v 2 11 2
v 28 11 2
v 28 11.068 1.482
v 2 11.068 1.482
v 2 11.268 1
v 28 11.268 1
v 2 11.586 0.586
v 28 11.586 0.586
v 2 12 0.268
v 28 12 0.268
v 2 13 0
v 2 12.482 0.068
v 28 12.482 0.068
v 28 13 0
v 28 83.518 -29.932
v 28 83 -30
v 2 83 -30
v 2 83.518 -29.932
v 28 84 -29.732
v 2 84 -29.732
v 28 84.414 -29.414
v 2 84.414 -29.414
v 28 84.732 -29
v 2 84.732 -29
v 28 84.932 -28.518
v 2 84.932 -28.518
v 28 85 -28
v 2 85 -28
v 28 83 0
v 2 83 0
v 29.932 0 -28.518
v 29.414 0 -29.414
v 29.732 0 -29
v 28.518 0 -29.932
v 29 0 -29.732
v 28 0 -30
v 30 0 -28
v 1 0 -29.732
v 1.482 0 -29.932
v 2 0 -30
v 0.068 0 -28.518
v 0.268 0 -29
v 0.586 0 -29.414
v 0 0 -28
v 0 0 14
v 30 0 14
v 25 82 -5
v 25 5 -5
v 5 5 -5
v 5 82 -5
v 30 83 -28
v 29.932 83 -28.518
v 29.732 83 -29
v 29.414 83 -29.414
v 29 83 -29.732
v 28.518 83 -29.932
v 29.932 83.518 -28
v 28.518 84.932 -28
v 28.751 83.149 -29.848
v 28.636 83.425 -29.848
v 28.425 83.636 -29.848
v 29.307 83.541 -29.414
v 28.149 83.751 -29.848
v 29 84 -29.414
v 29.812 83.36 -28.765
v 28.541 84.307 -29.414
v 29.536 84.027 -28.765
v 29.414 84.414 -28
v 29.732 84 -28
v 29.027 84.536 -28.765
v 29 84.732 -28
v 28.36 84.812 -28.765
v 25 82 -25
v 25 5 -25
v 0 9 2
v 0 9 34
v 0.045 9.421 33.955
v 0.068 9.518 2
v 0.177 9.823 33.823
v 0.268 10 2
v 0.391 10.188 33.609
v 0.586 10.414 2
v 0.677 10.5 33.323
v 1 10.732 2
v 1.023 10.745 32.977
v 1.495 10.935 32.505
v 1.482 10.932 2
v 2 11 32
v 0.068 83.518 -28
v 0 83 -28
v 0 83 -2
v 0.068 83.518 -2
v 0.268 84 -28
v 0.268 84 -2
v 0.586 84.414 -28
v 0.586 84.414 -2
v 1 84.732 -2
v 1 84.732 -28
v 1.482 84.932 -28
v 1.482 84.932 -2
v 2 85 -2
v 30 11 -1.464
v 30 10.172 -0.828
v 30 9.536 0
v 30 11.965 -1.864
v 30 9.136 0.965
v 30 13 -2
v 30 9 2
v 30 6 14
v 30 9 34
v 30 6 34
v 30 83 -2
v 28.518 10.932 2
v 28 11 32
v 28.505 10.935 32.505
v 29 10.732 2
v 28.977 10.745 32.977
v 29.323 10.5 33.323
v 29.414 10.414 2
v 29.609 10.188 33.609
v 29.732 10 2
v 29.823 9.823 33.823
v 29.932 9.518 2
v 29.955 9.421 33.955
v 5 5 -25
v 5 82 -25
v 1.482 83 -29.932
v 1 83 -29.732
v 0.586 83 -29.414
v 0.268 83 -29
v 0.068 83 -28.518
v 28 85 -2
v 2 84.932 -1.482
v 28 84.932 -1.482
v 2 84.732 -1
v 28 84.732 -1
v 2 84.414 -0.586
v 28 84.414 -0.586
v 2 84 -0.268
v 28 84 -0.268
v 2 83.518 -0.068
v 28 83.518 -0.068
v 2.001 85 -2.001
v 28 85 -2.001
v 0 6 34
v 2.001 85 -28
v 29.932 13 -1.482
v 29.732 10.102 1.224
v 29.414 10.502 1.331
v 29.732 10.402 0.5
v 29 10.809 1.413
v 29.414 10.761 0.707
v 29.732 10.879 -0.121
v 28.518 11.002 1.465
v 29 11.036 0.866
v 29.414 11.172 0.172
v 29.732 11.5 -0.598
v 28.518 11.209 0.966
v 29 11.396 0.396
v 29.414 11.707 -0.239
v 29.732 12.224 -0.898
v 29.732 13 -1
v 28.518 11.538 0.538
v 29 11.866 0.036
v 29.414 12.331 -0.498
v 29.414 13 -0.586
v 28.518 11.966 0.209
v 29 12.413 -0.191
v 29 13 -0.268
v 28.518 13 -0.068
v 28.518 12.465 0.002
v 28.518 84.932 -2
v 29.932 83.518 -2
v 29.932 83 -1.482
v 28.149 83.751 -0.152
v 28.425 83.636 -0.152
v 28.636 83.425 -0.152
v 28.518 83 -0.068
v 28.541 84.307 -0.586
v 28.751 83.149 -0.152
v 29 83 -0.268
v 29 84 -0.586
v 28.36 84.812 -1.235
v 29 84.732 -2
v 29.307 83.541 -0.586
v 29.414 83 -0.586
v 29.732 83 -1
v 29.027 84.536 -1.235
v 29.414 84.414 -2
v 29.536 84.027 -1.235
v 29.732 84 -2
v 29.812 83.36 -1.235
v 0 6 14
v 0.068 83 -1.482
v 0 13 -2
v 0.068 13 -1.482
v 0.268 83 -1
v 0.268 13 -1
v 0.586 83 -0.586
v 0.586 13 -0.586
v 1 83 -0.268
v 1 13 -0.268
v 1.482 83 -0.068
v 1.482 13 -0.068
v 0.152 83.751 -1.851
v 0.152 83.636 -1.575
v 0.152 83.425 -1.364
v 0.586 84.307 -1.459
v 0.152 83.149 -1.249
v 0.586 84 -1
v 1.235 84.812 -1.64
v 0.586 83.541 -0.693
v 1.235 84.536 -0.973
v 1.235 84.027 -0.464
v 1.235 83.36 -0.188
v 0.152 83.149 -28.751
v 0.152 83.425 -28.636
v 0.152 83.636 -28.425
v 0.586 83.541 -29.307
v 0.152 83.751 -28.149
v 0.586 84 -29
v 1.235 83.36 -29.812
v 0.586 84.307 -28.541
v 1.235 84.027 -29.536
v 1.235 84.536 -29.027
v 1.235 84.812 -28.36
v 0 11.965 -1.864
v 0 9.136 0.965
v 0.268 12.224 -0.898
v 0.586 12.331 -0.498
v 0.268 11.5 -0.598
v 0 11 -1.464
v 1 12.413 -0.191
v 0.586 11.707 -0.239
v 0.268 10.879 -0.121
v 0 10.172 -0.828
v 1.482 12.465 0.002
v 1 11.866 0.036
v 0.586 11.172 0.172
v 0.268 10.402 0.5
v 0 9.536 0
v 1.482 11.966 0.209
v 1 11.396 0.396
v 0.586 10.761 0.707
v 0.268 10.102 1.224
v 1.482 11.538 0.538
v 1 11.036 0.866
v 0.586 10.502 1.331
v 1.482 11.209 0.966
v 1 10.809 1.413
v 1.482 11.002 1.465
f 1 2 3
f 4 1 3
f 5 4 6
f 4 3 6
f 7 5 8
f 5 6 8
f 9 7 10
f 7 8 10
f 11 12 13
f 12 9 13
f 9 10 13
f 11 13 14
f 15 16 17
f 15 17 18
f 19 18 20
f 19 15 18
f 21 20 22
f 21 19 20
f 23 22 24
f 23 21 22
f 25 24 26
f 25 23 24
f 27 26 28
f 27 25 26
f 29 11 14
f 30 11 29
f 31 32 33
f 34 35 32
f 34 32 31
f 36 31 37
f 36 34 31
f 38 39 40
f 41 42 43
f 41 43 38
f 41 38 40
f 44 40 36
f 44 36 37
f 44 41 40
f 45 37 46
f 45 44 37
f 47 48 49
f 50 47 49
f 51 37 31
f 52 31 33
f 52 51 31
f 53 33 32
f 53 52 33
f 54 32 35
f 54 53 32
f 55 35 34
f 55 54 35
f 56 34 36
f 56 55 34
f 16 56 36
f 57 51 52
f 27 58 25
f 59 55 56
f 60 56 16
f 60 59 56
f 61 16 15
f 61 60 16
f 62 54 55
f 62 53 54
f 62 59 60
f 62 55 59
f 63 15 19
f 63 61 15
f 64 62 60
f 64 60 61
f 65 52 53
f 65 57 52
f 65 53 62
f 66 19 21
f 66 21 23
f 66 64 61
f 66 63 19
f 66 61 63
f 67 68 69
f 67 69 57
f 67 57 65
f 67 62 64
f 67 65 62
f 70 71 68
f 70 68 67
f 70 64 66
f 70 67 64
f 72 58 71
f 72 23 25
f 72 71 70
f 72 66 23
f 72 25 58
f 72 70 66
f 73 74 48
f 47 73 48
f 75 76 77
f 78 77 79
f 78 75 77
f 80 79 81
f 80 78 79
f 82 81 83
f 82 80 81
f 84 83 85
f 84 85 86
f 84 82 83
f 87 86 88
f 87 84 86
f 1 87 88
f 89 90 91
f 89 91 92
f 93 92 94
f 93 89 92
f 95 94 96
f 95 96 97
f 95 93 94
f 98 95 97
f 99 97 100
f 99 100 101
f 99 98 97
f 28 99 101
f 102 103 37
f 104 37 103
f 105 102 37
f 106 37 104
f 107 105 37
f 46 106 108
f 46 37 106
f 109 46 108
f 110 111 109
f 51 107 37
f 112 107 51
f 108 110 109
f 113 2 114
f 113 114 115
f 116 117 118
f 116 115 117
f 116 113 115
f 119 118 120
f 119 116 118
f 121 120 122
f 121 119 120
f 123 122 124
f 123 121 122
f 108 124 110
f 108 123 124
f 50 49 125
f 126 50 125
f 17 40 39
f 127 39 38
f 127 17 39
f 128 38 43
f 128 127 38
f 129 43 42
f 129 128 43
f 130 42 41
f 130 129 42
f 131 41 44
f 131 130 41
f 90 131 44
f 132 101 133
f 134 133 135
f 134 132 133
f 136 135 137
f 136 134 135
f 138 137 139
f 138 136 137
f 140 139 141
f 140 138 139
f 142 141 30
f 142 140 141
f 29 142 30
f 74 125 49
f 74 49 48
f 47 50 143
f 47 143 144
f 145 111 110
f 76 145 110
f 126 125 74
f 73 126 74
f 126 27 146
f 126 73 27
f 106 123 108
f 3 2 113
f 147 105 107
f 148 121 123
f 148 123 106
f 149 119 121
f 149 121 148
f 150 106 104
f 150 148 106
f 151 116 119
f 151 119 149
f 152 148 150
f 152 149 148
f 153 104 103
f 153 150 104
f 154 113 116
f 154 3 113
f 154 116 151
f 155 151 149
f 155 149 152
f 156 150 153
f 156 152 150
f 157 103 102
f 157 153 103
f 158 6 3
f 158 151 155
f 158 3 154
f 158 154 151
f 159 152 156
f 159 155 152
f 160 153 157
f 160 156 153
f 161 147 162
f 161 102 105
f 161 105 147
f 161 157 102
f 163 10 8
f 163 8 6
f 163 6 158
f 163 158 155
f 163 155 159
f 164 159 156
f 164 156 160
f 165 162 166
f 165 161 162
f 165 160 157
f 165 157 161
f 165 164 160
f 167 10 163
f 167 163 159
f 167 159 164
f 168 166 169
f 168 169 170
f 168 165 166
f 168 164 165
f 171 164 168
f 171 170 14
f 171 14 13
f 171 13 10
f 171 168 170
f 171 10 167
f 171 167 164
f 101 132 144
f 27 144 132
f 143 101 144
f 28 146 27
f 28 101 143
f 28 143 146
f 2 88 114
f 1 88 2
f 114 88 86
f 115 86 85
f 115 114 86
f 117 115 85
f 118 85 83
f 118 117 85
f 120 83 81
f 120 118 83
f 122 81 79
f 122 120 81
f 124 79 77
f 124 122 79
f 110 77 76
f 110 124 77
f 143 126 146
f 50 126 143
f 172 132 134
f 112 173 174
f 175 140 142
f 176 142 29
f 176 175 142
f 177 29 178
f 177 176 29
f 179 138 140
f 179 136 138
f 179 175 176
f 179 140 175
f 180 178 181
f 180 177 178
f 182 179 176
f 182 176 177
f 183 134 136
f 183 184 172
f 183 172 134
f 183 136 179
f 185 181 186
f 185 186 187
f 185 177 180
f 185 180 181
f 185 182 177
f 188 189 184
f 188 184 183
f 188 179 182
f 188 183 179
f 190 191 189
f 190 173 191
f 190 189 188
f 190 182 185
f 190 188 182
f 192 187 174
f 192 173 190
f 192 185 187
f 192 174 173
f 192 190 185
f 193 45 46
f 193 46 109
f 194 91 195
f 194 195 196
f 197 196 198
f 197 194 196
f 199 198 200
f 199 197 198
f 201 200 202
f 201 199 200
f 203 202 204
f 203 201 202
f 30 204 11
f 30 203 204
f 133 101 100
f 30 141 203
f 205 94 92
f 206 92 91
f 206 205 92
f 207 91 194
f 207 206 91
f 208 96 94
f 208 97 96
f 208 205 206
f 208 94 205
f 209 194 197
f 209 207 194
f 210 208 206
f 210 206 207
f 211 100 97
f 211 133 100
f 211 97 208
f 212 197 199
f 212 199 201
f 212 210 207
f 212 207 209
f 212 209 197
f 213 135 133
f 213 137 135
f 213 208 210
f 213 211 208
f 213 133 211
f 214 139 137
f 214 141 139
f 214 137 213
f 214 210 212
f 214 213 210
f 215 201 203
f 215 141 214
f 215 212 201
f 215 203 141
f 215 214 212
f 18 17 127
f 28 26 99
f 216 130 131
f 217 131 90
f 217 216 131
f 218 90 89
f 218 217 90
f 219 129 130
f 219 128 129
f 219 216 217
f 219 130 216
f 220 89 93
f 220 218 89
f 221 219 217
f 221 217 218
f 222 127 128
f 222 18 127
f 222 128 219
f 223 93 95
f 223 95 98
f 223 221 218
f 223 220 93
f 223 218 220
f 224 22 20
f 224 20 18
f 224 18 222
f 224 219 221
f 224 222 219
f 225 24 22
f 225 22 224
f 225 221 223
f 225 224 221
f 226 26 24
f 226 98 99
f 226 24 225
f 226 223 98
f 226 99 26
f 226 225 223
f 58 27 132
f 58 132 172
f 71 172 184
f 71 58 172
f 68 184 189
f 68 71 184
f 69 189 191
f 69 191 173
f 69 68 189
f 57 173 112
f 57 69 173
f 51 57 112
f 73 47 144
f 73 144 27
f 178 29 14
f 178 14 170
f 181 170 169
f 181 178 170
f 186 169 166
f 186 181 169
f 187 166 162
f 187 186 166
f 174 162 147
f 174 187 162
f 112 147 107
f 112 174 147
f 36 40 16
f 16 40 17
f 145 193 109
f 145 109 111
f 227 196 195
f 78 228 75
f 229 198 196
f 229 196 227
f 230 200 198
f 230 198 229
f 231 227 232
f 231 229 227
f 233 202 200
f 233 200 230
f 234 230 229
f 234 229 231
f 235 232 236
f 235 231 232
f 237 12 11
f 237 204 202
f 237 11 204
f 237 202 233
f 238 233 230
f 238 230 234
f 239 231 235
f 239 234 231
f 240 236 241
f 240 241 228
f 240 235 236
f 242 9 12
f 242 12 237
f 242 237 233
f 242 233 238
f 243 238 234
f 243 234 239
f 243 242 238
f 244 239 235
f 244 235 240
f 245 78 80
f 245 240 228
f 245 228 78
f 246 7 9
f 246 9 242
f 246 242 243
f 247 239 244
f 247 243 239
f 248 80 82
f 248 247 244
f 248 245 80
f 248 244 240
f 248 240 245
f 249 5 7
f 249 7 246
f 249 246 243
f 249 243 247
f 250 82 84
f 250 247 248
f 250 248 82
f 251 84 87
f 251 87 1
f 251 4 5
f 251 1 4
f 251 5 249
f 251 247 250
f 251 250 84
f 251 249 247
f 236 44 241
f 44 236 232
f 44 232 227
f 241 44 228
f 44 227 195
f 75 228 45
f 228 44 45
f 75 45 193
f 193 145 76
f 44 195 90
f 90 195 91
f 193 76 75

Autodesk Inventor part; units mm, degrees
ref_plane "YZ Plane" through (0, 0, 0) normal (1, 0, 0) x (0, 1, 0)
ref_plane "XZ Plane" through (0, 0, 0) normal (0, 1, 0) x (-1, 0, 0)
ref_plane "XY Plane" through (0, 0, 0) normal (0, 0, 1) x (1, 0, 0)
sketch "Sketch1" plane through (0, 0, 0) normal (1, 0, 0) x (0, 1, 0)
  line L0 (0, 0) -> (0, -30)
  line L1 (11, 0) -> (30, 0) construction
  line L2 (0, -30) -> (85, -30)
  line L3 (11, 0) -> (85, 0)
  line L4 (85, 0) -> (85, -30)
  line L5 (0, 0) -> (0, 14)
  line L6 (11, 0) -> (14, 0) construction
  line L7 (0, 14) -> (6, 14)
  line L8 (6, 14) -> (6, 34)
  line L9 (6, 34) -> (11, 34)
  line L10 (11, 34) -> (11, 0)
  dimension "d0" = 30
  dimension "d2" = 85
  dimension "d4" = 14
  dimension "d6" = 6
  dimension "d7" = 20
  dimension "d8" = 5
  dimension "d9" = 34
extrude "Extrusion1" add sketch "Sketch1" along normal blind 30
sketch "Sketch2" plane through (0, 85, 0) normal (0, 1, 0) x (1, 0, 0)
  line L0 (5, 5) -> (5, 25)
  line L1 (5, 5) -> (25, 5) construction
  line L2 (5, 25) -> (25, 25)
  line L3 (25, 25) -> (25, 5)
  line L4 (25, 5) -> (5, 5)
  point P0 (0, 0)
  dimension "d13" = 20
  dimension "d14" = 90
  dimension "d15" = 20
  dimension "d16" = 90
  dimension "d17" = 20
  dimension "d18" = 90
  dimension "d19" = 20
  dimension "d20" = 90
extrude "Extrusion2" cut sketch "Sketch2" against normal blind 80
fillet "Fillet1" radius 2 12 edges at (30, 85, -15) (15, 85, 0) (15, 85, -30) (0, 85, -15) (30, 48, 0) (30, 42.5, -30) (0, 48, 0) (0, 42.5, -30) (0, 11, 17) (15, 11, 34) (30, 11, 17) (15, 11, 0)
chamfer "Chamfer1" distance 3 angle 45 4 edges at (15, 85, -5) (5, 85, -15) (15, 85, -25) (25, 85, -15)
properties part number "flexibler_standfuß_v0.5"
